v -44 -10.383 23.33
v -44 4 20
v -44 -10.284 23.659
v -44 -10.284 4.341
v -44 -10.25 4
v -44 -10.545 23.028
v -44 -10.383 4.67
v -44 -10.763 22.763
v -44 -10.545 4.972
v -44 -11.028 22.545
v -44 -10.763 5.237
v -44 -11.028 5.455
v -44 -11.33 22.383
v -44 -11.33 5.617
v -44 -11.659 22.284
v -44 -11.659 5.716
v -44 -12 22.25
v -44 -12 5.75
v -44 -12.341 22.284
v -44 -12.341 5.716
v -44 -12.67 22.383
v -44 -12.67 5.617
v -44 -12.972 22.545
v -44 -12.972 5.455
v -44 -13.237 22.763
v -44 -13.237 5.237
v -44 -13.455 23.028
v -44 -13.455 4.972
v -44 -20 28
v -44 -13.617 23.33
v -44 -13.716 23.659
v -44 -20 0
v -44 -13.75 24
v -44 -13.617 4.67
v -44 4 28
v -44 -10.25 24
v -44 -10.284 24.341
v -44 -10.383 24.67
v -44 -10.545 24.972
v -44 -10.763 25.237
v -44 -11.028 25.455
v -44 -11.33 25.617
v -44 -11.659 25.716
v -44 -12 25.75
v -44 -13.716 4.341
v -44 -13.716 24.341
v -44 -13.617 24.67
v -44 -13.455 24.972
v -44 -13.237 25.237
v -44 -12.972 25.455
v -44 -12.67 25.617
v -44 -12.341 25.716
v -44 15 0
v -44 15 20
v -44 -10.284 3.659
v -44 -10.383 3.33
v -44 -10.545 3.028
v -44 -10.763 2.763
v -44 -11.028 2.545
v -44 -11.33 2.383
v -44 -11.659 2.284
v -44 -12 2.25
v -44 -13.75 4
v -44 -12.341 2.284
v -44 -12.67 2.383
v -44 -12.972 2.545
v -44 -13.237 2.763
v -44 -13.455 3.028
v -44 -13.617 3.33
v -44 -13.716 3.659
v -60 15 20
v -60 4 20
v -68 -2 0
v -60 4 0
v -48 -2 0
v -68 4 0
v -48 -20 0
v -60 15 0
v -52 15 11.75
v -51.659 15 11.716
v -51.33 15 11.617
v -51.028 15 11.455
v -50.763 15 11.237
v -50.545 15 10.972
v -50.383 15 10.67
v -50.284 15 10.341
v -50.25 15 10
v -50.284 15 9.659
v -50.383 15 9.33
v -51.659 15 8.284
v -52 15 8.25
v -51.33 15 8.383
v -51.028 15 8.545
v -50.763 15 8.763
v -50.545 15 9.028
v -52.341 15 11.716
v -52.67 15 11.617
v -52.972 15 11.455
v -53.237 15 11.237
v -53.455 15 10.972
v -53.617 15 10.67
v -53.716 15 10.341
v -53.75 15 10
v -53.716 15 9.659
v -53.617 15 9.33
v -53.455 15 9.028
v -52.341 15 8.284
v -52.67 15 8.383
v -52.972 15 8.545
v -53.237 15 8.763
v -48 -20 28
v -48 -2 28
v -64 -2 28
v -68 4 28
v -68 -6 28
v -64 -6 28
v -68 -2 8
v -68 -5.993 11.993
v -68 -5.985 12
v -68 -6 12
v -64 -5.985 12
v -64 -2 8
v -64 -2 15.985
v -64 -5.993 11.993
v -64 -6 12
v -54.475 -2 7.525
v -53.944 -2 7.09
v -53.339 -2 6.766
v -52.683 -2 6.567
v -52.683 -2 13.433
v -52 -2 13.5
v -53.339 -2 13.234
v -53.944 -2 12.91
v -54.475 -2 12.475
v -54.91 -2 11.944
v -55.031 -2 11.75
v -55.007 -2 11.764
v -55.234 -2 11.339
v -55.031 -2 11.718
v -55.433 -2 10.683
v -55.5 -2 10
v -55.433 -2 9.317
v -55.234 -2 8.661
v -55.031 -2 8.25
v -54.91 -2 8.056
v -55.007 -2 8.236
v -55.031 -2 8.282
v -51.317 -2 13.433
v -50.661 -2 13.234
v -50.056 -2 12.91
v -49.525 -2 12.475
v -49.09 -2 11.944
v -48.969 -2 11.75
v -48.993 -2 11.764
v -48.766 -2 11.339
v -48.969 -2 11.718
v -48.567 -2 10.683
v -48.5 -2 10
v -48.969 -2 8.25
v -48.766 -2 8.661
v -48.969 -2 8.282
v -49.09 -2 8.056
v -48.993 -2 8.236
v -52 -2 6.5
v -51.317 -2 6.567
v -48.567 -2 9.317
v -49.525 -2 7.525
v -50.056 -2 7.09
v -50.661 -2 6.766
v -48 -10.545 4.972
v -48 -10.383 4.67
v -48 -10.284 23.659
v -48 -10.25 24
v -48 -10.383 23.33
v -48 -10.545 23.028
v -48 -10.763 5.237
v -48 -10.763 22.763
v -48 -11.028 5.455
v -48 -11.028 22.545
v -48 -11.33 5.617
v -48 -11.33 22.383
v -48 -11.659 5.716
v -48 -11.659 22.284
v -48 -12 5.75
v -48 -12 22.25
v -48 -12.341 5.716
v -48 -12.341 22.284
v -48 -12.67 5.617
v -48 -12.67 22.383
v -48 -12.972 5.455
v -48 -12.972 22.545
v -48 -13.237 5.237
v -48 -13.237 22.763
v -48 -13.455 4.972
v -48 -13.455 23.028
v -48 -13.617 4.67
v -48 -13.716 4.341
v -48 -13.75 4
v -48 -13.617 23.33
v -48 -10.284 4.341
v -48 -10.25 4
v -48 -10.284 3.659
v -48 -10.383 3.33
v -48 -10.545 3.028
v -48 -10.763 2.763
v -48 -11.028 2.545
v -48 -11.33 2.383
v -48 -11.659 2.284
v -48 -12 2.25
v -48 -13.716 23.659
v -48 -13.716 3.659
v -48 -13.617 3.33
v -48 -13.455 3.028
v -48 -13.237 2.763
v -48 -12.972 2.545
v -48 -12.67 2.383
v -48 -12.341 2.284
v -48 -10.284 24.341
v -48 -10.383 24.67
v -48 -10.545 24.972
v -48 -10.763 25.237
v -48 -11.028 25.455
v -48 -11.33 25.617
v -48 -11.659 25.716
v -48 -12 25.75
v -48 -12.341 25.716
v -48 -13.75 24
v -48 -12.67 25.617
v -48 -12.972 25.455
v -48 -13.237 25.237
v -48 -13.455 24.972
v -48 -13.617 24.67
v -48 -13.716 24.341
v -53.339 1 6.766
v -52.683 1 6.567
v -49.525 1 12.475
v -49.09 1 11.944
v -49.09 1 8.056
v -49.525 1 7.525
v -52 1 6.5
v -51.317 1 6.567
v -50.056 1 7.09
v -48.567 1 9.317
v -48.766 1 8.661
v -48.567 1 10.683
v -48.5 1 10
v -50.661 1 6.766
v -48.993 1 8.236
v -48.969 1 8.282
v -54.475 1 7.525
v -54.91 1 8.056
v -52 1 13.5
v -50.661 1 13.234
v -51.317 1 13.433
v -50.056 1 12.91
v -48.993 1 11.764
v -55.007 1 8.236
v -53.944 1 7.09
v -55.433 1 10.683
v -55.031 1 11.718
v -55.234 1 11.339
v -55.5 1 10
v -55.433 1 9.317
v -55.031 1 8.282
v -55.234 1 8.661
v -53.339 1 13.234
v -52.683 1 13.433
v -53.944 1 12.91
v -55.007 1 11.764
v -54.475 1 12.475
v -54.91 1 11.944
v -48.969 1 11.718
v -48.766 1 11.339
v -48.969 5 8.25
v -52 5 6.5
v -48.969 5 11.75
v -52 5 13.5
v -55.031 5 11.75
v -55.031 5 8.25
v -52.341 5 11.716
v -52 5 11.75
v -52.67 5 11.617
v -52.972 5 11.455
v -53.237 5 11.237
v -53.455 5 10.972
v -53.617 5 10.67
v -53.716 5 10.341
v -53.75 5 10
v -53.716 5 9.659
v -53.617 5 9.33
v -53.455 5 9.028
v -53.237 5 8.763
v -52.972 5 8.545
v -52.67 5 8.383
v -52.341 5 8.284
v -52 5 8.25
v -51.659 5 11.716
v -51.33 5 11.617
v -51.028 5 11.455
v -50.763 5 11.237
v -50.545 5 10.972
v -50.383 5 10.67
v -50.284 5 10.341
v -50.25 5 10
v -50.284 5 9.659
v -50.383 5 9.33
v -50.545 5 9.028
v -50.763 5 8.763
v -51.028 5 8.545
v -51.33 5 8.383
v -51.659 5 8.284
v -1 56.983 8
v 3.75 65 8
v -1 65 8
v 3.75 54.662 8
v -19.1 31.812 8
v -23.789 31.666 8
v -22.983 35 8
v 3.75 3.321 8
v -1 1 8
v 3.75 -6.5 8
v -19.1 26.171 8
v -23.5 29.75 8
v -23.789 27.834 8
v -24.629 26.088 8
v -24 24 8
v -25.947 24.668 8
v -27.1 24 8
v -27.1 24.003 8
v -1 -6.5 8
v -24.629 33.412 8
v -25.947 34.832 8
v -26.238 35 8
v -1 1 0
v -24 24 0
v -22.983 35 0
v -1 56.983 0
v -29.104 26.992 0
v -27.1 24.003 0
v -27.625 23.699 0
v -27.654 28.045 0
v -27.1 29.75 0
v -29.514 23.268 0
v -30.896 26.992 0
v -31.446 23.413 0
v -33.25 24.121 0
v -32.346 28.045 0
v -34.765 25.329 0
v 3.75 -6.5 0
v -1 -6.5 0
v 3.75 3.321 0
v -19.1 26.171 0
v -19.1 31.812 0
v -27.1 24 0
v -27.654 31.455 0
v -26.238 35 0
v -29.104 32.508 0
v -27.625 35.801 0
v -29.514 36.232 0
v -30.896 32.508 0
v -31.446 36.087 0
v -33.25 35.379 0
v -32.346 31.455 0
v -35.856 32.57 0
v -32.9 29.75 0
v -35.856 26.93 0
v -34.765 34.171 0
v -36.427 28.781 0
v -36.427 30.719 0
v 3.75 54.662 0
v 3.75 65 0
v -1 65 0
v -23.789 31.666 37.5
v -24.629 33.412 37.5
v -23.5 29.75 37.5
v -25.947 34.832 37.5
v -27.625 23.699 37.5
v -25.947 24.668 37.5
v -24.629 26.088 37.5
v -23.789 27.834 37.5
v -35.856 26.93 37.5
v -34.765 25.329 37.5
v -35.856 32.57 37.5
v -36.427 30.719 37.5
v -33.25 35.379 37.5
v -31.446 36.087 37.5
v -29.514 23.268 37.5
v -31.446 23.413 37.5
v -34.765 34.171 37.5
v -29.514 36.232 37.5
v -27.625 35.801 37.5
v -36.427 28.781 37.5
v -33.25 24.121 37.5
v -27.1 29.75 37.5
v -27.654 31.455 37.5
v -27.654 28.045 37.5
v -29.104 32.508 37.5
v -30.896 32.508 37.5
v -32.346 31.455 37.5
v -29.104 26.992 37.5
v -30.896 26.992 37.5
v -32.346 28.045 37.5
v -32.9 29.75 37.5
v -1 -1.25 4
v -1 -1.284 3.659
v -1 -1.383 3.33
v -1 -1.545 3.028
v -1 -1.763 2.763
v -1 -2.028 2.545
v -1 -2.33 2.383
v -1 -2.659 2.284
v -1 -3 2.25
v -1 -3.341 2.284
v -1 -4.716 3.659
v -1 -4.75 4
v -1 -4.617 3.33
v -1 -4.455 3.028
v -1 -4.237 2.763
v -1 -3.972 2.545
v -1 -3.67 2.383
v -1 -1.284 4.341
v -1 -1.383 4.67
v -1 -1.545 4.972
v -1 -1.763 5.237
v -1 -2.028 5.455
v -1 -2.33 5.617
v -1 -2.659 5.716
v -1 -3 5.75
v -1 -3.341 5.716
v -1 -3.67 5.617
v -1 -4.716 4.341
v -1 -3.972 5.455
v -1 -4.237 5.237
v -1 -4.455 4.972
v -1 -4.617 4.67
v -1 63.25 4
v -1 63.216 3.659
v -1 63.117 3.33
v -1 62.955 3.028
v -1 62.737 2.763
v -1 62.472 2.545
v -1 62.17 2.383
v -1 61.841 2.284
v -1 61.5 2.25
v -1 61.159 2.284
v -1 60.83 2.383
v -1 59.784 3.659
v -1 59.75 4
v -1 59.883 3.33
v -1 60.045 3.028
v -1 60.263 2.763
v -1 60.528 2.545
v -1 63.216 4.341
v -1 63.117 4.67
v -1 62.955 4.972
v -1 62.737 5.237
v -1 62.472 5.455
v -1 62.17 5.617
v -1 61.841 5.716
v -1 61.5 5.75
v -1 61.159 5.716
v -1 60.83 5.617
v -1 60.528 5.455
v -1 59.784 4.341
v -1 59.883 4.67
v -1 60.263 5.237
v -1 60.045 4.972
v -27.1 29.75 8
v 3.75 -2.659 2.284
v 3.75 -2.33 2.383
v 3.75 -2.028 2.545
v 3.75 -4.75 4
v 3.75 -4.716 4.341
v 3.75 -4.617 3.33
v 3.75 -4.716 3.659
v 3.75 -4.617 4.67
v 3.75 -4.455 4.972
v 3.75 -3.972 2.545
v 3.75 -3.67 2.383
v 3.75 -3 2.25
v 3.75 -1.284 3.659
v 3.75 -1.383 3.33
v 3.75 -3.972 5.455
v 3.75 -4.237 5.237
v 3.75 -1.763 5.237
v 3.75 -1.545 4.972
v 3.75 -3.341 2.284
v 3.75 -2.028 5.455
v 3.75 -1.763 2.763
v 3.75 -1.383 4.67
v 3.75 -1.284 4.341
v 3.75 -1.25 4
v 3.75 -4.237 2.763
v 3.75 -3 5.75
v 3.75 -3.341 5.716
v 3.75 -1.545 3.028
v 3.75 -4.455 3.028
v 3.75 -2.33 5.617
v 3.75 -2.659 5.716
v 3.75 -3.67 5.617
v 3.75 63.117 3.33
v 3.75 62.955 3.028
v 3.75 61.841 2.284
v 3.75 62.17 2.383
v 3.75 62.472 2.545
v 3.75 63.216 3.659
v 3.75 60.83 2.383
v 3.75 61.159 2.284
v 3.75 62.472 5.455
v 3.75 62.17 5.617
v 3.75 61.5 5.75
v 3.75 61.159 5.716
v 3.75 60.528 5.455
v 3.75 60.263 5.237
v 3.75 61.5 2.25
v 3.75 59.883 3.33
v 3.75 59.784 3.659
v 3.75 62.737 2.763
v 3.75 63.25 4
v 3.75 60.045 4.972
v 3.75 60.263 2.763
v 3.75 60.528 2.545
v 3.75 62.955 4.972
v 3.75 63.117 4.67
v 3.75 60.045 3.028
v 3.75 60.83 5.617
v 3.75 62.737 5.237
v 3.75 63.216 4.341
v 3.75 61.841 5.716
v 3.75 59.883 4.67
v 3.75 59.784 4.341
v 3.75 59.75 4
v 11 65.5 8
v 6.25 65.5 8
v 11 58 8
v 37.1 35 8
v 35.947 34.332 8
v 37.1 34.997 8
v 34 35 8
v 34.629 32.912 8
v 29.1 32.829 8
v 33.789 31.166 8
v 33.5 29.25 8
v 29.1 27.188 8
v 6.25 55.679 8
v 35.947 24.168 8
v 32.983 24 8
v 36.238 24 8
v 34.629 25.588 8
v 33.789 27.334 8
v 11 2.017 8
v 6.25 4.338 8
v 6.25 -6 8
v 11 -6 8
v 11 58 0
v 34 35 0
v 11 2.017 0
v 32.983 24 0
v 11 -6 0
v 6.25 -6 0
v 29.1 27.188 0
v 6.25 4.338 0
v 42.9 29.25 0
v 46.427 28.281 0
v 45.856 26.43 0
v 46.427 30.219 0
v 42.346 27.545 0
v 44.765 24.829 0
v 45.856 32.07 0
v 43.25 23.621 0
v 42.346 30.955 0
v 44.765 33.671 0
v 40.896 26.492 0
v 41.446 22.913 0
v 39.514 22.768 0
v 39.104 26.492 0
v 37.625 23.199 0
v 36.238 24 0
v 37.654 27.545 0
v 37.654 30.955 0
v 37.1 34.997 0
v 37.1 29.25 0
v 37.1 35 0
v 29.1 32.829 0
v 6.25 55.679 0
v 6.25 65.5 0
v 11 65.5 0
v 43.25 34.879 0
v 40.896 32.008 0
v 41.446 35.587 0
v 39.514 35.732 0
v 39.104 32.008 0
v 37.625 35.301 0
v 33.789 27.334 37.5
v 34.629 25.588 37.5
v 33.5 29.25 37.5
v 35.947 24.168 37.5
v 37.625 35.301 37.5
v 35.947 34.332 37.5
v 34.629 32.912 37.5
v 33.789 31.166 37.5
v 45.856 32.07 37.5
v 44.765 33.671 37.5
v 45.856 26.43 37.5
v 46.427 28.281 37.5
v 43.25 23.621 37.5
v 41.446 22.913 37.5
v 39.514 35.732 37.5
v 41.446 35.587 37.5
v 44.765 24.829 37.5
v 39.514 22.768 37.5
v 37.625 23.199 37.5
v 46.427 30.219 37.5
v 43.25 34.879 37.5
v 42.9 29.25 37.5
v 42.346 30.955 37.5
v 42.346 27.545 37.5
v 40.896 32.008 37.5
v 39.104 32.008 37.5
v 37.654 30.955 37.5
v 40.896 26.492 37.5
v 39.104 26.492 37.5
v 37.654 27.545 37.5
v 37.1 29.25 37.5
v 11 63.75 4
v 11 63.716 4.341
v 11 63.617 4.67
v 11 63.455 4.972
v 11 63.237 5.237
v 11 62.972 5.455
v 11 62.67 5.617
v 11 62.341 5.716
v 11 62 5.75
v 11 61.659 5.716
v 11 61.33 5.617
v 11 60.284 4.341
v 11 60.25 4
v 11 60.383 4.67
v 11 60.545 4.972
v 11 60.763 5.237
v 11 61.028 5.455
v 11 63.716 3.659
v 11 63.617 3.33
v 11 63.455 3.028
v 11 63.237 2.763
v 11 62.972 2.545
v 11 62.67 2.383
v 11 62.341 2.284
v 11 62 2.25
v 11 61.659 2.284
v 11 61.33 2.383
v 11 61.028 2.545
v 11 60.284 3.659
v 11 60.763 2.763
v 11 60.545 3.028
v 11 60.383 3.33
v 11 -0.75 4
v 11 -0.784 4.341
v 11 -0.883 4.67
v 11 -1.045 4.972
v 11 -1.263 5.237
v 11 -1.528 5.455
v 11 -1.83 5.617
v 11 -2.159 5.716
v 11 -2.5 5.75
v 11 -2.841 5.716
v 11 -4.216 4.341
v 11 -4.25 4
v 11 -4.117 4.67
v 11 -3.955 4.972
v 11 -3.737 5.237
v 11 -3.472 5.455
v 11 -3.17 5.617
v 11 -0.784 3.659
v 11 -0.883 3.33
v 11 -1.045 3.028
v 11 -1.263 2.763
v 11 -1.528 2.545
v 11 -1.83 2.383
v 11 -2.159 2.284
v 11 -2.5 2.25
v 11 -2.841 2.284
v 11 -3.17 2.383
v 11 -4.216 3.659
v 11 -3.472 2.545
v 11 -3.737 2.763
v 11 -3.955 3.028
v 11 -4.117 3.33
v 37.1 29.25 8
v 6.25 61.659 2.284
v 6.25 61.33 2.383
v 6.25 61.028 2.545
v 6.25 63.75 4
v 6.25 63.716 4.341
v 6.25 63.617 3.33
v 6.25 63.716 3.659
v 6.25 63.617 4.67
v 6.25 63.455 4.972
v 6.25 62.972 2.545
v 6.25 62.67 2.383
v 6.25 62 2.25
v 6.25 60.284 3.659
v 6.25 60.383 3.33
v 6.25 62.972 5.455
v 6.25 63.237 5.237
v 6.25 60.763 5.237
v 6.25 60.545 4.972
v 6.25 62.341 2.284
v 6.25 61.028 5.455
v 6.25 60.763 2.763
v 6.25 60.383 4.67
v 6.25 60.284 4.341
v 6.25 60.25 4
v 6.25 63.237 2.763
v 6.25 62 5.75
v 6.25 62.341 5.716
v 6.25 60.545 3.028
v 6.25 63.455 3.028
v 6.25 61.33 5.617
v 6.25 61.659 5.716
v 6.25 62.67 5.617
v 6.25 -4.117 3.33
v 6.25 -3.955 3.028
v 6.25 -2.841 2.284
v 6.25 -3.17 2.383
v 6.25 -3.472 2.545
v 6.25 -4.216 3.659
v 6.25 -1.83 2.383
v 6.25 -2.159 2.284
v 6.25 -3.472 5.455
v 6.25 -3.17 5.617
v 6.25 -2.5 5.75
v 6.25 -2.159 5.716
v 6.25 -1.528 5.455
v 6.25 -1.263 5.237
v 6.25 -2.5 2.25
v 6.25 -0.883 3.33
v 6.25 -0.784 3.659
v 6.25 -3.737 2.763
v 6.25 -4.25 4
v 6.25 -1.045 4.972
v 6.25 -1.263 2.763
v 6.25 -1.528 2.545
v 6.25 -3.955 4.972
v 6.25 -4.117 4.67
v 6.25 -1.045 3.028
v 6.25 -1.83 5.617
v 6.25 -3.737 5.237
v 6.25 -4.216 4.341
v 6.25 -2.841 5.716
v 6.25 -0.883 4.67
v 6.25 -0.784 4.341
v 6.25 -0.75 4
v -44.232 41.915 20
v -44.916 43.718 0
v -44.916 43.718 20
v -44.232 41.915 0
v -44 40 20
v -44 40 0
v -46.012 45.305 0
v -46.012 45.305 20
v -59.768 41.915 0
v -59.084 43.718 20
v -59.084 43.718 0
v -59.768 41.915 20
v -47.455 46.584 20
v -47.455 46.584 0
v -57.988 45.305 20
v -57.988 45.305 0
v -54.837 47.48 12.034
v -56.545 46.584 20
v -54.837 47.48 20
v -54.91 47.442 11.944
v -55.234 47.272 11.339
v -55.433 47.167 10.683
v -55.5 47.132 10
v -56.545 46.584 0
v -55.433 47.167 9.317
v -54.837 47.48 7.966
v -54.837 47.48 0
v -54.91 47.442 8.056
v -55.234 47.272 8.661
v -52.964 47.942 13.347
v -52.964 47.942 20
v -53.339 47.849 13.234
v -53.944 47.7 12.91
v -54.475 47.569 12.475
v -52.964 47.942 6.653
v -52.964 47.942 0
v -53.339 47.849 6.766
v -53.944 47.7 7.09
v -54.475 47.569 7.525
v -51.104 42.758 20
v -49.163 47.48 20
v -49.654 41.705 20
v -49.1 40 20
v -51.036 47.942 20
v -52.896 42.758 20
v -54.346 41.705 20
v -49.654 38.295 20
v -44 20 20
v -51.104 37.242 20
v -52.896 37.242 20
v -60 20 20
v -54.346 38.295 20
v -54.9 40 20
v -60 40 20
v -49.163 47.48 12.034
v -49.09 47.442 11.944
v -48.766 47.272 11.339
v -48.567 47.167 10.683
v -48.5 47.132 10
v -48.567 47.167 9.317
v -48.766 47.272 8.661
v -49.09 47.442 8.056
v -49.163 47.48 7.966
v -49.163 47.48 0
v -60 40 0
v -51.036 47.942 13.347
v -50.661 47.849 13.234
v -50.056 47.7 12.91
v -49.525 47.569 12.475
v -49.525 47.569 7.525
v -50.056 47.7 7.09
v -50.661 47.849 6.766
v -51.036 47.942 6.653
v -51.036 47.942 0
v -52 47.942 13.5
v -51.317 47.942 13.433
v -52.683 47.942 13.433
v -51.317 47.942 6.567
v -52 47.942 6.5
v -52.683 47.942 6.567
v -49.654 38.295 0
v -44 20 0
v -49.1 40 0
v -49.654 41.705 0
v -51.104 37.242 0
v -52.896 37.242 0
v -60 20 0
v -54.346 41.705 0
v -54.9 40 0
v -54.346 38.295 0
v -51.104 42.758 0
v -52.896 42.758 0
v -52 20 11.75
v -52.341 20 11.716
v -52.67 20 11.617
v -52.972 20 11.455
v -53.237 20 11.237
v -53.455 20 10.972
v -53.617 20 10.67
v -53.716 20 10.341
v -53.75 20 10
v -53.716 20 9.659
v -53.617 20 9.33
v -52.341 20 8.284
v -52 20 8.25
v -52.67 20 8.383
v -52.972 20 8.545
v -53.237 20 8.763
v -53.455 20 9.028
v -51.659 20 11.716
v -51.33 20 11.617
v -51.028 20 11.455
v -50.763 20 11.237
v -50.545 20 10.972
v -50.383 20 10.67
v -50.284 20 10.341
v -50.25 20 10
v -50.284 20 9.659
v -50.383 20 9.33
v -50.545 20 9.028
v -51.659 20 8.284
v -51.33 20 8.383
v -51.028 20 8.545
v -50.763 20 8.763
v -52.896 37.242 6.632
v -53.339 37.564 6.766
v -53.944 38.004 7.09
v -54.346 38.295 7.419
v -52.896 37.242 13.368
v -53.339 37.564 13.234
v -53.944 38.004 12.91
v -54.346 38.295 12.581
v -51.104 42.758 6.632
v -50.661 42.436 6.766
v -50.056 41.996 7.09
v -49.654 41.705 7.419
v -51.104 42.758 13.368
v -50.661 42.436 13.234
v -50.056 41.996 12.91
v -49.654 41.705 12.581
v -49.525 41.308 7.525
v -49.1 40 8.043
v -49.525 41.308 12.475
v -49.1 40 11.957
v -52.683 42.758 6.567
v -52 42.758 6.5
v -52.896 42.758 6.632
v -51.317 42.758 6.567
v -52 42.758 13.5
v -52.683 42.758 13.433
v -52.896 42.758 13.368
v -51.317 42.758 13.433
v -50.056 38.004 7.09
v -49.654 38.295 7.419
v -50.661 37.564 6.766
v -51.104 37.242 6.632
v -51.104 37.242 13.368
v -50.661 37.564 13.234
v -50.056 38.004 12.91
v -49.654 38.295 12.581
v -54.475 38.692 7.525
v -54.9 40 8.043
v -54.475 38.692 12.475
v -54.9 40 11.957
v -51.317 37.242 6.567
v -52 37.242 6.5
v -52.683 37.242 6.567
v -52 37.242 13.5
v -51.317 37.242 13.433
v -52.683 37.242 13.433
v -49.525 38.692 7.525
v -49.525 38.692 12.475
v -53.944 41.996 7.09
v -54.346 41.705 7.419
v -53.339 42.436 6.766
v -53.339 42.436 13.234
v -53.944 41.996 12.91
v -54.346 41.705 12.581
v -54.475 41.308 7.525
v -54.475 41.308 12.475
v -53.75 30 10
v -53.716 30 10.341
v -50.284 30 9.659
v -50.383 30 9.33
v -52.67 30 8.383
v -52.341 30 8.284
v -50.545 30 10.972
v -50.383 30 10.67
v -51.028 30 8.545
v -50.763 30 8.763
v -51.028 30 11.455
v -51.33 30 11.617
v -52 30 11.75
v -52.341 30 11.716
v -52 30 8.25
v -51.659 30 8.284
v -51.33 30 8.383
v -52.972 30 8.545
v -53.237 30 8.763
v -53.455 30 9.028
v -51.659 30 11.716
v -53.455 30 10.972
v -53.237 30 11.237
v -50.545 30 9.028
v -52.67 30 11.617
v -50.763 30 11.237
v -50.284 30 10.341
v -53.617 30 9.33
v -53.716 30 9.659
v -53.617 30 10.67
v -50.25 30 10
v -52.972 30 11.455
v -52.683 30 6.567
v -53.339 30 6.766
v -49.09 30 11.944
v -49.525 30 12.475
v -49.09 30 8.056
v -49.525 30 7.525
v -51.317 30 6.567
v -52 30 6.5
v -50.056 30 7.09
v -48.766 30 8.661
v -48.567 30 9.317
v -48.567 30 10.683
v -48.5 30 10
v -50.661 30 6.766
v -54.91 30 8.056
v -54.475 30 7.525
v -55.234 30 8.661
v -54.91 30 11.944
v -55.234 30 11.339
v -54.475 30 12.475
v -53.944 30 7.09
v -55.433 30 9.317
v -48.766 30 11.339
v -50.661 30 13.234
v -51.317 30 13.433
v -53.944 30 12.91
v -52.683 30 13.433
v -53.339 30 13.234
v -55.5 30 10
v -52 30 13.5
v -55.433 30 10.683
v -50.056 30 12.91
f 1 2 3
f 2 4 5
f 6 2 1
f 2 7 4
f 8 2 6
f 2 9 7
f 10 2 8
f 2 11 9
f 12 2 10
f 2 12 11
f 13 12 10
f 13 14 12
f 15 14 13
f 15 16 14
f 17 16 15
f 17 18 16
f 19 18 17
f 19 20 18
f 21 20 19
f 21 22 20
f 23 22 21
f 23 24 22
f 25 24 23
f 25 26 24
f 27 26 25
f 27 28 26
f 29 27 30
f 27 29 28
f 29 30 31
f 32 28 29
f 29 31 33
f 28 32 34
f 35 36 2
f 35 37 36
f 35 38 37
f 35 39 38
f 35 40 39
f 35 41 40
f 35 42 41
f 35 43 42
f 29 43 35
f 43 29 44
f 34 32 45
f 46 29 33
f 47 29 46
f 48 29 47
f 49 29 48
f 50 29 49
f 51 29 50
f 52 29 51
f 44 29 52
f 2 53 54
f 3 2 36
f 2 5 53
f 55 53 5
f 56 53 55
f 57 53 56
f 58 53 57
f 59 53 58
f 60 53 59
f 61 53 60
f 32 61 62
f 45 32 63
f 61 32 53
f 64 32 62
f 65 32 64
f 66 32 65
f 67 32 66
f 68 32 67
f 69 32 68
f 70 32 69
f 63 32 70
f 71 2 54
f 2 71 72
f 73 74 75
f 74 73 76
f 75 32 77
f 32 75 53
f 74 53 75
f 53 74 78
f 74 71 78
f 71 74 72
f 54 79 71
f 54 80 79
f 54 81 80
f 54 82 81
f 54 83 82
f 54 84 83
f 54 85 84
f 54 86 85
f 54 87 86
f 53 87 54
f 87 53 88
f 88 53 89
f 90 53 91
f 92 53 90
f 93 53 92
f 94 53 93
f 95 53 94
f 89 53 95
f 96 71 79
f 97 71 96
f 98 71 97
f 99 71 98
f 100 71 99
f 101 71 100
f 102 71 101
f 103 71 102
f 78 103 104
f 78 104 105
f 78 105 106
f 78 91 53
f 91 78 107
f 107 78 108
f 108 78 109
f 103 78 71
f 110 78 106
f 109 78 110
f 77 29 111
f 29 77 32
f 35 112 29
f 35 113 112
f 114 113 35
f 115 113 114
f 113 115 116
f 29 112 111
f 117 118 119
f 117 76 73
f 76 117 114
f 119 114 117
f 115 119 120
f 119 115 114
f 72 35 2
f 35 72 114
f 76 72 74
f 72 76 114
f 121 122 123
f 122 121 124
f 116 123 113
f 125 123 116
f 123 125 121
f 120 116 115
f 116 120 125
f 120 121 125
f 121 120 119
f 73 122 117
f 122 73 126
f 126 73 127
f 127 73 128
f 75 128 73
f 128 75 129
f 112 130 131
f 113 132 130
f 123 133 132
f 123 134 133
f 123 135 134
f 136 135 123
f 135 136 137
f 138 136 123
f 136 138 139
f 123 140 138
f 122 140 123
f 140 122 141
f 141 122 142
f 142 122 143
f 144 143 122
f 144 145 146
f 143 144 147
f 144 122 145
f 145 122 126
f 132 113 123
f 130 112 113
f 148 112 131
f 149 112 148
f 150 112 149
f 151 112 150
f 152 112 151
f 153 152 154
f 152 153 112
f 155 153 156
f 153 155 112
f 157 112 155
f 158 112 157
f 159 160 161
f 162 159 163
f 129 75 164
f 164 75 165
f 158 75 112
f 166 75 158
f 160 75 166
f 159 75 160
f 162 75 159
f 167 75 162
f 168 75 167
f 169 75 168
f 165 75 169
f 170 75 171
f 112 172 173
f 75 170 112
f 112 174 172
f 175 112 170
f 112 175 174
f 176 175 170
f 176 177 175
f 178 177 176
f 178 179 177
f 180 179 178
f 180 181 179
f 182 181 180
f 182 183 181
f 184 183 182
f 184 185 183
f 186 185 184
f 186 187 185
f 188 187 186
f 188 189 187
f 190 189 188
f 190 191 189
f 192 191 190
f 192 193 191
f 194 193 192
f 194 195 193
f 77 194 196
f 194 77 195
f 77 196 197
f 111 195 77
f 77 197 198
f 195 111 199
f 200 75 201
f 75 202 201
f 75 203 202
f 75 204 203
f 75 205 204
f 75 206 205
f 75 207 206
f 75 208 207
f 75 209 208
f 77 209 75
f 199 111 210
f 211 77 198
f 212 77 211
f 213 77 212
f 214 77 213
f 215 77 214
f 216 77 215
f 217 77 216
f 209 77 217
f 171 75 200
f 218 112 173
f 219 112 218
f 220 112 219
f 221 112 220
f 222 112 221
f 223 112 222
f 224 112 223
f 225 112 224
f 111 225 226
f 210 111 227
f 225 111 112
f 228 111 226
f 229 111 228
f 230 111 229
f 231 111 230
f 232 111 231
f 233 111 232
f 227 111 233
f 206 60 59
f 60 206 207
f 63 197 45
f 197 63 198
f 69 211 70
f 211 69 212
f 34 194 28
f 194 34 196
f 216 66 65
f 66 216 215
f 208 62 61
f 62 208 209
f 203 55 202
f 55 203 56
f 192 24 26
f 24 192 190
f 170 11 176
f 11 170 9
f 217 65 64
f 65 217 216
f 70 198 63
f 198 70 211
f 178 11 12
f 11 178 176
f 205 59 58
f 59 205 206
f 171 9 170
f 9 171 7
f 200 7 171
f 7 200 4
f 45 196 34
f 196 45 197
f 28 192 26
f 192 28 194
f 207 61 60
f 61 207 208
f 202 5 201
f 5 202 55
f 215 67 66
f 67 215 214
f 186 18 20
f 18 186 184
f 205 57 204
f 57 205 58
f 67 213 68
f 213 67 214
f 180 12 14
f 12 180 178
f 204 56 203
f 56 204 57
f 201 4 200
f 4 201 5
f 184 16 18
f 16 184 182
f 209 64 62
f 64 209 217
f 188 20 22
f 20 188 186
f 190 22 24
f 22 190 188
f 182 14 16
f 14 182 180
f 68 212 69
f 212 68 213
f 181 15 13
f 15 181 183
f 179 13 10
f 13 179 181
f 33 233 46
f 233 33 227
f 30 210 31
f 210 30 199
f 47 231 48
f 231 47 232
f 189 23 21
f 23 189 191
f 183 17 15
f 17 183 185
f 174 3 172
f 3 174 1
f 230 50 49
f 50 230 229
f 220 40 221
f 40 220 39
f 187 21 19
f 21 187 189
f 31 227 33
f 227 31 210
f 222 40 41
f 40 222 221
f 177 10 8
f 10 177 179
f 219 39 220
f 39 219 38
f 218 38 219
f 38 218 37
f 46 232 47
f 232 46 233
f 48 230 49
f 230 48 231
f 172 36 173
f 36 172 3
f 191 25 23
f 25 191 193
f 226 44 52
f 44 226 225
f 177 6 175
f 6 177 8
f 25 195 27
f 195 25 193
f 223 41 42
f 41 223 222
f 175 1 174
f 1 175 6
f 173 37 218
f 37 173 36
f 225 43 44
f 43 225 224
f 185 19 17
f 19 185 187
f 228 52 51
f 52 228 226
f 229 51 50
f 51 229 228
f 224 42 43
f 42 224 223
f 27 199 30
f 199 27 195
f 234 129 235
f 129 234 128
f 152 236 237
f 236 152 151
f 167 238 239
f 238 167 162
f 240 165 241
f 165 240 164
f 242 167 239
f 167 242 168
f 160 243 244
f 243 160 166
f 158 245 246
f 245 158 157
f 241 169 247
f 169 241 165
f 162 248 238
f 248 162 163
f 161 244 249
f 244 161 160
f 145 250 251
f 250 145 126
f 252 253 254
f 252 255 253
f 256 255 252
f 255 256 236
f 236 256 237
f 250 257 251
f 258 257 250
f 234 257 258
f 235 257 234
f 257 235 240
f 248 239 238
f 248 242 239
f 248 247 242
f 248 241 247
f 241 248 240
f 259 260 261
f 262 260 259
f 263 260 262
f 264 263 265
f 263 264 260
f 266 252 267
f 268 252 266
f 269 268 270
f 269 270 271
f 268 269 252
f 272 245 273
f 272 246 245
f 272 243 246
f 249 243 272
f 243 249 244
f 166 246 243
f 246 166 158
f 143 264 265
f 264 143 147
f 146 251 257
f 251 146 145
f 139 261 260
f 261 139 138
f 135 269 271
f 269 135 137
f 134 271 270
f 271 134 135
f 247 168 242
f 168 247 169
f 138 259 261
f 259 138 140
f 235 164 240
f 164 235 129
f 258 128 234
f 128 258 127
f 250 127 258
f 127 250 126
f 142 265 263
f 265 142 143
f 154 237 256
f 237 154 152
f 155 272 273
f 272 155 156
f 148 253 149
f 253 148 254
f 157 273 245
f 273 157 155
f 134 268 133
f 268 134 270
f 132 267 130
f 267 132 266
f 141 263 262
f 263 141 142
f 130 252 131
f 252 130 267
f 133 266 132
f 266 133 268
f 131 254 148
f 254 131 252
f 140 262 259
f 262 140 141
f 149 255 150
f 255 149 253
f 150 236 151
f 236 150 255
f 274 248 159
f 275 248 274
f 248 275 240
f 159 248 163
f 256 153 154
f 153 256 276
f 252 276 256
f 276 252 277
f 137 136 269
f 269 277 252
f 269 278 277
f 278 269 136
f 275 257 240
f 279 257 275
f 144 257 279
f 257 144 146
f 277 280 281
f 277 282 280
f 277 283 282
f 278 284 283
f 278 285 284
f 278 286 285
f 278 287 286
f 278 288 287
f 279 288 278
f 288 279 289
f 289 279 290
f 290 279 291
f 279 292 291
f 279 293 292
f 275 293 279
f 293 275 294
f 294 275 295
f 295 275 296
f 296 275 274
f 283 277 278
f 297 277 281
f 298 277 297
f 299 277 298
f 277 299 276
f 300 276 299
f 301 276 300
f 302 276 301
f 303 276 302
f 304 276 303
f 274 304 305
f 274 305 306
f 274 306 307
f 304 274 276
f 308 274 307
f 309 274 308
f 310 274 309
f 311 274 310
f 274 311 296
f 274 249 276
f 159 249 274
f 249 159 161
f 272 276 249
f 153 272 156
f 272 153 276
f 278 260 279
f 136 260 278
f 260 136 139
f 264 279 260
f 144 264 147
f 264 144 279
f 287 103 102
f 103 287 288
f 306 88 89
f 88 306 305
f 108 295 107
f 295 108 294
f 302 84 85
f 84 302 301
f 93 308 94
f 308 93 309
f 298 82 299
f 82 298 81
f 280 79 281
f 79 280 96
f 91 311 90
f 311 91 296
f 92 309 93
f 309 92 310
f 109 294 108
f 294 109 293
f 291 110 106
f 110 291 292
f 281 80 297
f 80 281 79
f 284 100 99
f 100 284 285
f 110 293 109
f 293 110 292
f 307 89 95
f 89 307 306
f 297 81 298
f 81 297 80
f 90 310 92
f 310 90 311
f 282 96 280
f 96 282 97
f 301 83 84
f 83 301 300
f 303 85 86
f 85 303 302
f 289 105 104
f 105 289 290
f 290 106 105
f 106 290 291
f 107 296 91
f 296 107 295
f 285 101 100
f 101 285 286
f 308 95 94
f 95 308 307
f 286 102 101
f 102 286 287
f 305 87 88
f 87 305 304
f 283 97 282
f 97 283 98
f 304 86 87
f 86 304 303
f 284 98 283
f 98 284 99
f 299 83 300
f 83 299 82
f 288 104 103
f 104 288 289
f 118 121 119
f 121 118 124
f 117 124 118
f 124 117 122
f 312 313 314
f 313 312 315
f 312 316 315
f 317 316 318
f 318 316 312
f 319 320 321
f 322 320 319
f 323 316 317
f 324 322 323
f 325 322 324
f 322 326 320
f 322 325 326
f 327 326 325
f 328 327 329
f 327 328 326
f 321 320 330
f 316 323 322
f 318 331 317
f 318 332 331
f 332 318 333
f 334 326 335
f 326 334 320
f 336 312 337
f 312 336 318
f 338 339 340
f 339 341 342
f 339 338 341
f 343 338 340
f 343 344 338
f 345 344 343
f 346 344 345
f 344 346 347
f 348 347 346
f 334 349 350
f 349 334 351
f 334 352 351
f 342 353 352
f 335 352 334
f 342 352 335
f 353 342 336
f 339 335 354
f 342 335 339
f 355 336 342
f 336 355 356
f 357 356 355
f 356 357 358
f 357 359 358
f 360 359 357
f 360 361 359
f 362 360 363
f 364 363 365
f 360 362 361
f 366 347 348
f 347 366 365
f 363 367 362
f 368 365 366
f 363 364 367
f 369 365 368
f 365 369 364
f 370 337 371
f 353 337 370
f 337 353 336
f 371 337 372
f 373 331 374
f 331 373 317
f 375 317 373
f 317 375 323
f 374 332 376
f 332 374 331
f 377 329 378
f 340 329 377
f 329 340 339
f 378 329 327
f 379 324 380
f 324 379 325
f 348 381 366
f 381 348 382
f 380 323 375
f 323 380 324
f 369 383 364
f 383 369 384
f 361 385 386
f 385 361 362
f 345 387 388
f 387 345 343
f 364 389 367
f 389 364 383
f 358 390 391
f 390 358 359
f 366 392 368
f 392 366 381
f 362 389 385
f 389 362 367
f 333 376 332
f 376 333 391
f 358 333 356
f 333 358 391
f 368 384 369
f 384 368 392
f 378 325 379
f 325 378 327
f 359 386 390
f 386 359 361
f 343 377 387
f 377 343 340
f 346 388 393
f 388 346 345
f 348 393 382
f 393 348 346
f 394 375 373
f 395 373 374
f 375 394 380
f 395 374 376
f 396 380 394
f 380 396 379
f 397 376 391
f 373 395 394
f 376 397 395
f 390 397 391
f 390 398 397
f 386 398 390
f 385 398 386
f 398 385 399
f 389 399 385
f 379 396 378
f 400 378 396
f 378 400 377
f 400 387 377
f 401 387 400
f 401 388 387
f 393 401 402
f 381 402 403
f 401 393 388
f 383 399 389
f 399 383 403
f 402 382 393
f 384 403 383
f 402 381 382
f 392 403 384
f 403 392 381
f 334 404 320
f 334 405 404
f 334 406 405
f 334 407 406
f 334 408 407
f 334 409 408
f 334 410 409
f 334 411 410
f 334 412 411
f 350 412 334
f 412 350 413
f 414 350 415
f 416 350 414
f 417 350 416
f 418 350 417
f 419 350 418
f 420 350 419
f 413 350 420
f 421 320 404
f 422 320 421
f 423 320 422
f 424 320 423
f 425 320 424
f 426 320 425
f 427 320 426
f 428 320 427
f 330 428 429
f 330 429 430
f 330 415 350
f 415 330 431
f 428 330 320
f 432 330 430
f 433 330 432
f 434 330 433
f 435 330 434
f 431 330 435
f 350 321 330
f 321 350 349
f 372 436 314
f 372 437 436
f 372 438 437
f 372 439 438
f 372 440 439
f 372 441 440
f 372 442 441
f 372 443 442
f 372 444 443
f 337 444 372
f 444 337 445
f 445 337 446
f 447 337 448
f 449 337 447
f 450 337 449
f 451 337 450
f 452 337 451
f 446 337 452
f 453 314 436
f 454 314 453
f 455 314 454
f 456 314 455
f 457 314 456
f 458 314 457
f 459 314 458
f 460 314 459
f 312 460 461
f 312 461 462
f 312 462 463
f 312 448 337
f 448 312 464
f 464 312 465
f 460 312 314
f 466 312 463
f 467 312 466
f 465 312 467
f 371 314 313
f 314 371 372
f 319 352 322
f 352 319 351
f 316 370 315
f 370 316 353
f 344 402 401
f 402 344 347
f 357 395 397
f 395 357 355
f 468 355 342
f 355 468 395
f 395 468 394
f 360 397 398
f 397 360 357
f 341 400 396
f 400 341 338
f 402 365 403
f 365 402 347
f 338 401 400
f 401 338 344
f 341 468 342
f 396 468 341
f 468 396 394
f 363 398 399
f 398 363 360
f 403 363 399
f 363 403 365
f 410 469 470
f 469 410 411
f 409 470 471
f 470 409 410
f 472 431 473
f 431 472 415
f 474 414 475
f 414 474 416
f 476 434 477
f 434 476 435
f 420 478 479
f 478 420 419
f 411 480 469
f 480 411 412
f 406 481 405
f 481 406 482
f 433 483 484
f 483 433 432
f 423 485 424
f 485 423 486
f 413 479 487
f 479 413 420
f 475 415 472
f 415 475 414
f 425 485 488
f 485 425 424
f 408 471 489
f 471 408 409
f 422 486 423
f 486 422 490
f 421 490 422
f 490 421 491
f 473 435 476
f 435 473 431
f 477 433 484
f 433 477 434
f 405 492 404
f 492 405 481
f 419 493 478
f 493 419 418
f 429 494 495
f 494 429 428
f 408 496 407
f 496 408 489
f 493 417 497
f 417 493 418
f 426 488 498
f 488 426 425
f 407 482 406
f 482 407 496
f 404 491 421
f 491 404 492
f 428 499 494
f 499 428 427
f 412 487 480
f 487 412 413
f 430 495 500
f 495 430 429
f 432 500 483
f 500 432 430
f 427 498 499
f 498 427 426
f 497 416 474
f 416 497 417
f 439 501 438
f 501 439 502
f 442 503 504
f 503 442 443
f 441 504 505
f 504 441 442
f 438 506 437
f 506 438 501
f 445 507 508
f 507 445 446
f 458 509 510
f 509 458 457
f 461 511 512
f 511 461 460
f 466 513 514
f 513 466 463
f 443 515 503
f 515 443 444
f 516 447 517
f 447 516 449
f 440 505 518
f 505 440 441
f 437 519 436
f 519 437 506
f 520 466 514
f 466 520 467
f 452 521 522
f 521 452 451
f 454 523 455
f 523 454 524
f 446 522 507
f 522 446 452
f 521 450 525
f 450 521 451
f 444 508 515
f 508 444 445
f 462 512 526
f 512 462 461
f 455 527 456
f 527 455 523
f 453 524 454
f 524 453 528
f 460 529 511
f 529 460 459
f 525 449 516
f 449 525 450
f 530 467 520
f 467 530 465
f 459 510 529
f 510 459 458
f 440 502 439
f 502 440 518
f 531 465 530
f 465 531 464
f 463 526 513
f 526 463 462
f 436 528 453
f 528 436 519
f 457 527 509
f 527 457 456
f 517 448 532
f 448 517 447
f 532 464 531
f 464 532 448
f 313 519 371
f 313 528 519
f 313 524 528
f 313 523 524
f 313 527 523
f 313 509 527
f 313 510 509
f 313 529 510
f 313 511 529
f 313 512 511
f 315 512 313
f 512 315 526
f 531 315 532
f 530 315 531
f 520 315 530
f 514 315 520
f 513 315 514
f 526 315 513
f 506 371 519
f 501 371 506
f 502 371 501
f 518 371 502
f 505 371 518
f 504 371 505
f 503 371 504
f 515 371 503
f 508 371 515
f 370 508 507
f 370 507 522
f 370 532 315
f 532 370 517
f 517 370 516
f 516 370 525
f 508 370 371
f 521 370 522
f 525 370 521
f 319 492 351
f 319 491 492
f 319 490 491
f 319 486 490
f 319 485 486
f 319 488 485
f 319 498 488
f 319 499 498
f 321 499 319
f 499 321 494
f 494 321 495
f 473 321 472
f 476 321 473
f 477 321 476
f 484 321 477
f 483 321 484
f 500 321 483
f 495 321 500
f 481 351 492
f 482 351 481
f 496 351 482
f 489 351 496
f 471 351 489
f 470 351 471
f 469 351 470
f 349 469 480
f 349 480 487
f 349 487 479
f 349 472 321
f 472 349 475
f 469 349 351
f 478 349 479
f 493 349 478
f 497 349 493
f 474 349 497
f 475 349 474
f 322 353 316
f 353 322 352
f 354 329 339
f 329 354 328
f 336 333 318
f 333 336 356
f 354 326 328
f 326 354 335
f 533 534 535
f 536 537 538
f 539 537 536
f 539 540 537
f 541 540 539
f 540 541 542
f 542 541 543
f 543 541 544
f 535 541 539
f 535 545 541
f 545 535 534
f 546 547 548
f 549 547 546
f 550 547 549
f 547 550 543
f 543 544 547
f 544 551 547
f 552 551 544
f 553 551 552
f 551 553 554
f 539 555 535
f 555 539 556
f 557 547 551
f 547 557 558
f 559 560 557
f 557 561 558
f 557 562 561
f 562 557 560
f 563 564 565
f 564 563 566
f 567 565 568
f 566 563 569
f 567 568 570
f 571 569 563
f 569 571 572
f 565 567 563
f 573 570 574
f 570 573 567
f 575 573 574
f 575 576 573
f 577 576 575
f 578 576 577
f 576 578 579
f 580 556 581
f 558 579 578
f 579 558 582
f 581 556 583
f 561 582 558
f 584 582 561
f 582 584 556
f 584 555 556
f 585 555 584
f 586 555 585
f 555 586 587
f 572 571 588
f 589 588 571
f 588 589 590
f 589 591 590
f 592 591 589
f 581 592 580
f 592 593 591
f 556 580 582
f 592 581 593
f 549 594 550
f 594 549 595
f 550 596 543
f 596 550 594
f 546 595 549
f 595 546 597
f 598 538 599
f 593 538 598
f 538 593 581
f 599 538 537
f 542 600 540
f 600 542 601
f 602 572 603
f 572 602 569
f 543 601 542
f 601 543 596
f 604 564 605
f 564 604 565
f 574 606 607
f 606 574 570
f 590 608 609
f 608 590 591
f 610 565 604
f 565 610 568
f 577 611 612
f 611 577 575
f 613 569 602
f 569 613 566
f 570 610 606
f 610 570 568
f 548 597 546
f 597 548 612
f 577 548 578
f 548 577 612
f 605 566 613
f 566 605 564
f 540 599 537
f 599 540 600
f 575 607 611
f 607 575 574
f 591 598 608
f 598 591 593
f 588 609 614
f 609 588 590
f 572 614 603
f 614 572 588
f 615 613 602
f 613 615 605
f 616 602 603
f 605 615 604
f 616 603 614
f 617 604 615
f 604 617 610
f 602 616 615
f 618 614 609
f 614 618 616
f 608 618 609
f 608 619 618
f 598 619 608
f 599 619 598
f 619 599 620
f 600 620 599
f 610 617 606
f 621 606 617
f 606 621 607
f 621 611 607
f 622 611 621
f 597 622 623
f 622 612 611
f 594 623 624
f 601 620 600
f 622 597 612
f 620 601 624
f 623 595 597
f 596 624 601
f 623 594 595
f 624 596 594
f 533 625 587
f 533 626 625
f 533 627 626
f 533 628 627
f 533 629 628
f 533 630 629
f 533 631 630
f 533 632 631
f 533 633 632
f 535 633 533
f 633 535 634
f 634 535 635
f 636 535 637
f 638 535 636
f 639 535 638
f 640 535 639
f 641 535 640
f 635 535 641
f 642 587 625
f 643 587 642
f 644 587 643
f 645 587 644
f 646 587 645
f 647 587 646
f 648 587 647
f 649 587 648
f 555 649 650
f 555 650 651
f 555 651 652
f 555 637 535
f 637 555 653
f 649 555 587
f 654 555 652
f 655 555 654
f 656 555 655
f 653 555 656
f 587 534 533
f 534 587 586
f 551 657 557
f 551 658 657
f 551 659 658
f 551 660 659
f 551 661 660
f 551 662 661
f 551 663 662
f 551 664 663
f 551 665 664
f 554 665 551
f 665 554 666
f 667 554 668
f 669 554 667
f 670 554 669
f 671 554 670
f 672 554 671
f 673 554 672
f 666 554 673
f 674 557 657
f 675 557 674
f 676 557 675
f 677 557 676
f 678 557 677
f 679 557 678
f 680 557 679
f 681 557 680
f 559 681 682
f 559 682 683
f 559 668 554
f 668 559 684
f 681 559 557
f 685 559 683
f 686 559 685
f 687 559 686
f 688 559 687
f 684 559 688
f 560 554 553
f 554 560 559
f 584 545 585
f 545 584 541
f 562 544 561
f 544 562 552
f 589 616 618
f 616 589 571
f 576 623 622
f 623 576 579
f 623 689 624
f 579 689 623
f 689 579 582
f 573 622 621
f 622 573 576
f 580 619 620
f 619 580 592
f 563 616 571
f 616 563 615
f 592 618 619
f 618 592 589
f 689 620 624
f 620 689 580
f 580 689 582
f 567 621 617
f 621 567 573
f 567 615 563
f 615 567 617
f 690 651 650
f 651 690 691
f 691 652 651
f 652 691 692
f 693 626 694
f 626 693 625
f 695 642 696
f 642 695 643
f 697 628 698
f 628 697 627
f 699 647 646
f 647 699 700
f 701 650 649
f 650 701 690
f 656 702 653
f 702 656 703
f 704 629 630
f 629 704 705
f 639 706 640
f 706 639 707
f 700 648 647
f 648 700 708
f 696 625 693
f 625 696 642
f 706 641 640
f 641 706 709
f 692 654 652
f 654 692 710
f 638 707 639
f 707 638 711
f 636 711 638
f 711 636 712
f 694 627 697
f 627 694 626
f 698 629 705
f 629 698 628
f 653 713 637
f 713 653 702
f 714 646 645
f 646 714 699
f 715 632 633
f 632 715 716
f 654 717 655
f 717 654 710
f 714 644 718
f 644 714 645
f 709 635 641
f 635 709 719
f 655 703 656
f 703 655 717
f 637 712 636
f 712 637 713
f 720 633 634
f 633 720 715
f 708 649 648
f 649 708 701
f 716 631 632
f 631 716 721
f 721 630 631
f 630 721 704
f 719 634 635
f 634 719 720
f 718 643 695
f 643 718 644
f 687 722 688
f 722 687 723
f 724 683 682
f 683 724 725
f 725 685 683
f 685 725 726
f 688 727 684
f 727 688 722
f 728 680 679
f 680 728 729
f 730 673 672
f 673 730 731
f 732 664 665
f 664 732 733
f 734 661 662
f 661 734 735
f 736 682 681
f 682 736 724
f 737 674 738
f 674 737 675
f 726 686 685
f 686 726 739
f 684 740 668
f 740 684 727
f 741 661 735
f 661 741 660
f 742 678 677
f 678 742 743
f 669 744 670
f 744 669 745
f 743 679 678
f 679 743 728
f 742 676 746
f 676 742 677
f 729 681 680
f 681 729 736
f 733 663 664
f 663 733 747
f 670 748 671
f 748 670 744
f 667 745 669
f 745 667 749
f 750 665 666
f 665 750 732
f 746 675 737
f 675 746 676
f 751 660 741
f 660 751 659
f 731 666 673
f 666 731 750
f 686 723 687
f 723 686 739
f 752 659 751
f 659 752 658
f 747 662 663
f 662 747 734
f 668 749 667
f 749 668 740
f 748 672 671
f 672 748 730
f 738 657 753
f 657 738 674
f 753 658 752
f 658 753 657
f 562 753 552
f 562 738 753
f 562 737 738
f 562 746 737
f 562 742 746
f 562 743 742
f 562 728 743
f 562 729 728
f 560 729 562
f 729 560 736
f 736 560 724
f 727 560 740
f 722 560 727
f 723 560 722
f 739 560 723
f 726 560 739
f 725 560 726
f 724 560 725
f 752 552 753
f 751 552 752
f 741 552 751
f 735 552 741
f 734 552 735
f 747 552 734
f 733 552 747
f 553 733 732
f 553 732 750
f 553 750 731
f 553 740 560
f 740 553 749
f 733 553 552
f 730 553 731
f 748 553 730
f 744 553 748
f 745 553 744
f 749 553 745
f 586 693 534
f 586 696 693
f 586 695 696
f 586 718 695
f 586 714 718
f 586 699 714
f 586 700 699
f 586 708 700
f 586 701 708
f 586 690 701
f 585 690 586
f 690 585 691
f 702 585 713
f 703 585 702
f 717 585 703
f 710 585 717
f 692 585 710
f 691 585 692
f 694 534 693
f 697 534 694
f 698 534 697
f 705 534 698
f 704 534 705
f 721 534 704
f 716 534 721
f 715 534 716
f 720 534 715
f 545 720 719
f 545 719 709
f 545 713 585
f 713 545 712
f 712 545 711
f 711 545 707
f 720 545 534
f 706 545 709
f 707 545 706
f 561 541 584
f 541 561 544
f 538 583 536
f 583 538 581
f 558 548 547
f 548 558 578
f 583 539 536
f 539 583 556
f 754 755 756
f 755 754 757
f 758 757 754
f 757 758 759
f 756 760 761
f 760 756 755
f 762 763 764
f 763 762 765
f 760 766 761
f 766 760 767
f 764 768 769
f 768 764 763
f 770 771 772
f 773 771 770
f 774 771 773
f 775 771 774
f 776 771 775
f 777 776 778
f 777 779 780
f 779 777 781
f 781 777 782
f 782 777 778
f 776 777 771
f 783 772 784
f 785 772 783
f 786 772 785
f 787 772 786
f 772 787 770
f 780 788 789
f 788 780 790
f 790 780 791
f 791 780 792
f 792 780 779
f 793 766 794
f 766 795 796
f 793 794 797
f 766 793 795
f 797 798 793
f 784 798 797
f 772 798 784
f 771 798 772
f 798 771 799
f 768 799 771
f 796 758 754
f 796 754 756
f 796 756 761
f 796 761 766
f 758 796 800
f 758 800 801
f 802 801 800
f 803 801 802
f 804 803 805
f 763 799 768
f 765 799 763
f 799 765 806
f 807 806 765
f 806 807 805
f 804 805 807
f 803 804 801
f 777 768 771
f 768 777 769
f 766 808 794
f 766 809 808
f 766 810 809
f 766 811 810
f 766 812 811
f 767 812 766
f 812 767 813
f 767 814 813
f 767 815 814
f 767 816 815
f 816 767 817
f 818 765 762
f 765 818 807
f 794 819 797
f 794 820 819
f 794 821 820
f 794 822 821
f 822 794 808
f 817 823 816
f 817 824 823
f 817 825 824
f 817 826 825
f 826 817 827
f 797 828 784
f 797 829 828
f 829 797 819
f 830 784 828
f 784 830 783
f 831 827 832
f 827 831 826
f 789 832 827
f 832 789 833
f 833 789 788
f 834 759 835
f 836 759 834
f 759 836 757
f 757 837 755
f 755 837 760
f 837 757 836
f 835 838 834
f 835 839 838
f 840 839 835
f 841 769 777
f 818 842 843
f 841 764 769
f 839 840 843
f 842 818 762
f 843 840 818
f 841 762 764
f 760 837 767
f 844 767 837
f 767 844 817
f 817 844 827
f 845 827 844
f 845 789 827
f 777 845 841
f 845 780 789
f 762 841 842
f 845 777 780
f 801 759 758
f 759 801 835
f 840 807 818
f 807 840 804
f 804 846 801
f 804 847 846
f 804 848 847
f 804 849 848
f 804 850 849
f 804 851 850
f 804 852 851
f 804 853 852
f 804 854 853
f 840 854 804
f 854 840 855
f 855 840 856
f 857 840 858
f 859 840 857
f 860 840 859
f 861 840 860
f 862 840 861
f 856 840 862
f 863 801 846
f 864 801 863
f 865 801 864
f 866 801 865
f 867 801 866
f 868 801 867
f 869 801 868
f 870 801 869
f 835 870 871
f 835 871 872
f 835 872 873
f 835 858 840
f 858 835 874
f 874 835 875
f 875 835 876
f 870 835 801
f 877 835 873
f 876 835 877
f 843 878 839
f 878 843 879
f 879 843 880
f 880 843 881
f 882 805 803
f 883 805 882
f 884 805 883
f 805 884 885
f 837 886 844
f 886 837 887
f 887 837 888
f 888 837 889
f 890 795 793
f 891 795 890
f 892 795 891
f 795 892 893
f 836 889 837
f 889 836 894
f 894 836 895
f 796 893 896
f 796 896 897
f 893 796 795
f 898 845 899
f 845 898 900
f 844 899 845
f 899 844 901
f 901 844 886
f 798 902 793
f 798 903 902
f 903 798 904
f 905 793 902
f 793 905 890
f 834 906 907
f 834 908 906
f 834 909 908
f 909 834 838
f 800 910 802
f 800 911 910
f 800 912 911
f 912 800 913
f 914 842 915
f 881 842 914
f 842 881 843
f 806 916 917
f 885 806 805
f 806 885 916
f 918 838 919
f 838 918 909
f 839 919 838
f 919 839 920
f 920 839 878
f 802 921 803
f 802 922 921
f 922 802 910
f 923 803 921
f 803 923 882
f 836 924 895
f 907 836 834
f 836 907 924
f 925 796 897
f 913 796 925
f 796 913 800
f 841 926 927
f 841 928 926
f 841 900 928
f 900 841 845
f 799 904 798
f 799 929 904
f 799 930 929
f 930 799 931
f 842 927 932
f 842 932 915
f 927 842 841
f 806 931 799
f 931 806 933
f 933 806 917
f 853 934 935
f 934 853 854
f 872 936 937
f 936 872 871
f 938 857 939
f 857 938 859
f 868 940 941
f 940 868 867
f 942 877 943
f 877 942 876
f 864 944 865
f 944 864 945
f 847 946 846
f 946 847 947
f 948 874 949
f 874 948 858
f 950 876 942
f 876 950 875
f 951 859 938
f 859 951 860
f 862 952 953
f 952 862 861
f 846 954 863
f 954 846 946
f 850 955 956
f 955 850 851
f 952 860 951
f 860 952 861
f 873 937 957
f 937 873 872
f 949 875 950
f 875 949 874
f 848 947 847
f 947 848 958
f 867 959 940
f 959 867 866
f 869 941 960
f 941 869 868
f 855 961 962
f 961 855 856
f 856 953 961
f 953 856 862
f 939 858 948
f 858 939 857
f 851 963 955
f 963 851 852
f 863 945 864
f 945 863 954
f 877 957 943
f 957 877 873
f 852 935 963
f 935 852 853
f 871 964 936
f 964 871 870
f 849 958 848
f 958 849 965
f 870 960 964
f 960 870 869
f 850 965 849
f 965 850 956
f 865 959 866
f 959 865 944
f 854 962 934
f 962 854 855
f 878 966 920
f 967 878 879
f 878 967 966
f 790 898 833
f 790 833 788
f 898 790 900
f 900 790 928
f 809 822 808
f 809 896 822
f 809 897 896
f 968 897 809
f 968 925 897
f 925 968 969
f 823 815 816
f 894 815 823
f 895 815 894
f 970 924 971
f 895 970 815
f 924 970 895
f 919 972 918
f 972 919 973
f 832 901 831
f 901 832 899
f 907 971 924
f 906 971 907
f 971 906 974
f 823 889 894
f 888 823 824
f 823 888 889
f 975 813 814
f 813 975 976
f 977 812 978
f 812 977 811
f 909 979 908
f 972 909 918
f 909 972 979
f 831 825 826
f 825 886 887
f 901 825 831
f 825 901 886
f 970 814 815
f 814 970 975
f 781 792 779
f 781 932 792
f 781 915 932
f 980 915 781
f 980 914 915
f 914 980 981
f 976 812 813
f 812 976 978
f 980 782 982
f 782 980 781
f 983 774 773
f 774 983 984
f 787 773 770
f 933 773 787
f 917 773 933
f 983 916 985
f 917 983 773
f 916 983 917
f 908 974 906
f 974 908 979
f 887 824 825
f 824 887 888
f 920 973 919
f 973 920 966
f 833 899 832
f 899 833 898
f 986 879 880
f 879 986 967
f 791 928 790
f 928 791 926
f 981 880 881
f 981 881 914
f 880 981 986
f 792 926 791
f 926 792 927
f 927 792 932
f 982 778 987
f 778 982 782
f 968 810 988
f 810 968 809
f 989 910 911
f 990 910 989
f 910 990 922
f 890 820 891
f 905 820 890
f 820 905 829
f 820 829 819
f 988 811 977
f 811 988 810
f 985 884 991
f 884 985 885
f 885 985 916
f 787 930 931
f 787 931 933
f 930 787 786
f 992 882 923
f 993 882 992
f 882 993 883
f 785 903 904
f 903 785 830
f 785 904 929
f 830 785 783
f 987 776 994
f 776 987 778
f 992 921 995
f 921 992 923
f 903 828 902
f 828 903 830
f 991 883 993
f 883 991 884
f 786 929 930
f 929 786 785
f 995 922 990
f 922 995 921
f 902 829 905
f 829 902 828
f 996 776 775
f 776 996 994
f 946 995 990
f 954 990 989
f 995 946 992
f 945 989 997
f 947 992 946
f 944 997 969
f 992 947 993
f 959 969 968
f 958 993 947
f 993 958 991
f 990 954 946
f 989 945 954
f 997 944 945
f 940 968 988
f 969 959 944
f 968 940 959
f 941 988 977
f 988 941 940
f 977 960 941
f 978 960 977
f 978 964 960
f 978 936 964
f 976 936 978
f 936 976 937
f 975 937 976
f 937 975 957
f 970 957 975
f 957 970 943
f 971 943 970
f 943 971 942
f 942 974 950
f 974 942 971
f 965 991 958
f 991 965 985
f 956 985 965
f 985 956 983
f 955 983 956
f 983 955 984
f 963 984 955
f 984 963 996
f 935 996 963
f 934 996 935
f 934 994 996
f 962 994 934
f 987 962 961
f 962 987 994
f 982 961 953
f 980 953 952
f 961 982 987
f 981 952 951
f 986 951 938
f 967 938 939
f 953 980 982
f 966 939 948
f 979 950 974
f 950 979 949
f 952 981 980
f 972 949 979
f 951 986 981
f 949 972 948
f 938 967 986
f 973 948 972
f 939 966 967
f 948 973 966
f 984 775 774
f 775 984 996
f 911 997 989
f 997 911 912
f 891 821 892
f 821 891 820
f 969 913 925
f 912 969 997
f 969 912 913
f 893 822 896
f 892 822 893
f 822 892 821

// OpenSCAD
// This script creates a bracket for mounting the RepRapDiscount graphic LCD
// panel on top of the left side Z axis mount.
//
// Parts required:
//
// (1) 110 mm M5 rod
// (1) M5 locking nut
// (1) M5 hand twist nut
// (2) M5 washer
// (4) 3mm x 15mm bolts for arms
// (2) 3mm x 20mm bolts for base
// (1) 3mm x 25mm bolts for rotating parts
// (7) 3mm nuts
// (2) 3mm washers (optional)
// 
// Instructions: (old, for non rotation version)
//
// 1) print out all parts
// 2) remove the (2) bolts holding your top left Z axis bracket
// 3) place base of mount on top of frame and thread the 20mm bolts
//    through the top Z-axis bracket and the base (see photo on
//    Thingiverse) then add 3mm washers and nuts and tighten
// 4) mount arms to the LCD panel with the spacer side pointing 
//    toward the center
// 5) thread the 5/16" bolt through the arms and base 
// 6) adjust and tighten the 5/16" bolt
// 7) connect LCD panel ribbon cables
// 
// Created by: drcharlesbell@gmail.com
//
// Enjoy!

module bracket() {
  difference() {
    union() {
      rotate([0,0,45]) translate([0,-1,0]) cube([42,42,8]);
      translate([-30,29.75,0]) cylinder(37.5,6.5,6.5);
      translate([-1,-6.5,0]) cube([5,9,8]);
      translate([-1,55.5,0]) cube([5,9.5,8]);
    }
    rotate([0,0,45]) translate([5,-1,0]) cube([37,37,8]);
    translate([-30,29.75,0]) cylinder(38.5,2.9,2.9); //for M5 rods
    rotate([0,90,0]) translate([-4,-3,-1]) cylinder(10,1.75,1.75,$fn=32);
    rotate([0,90,0]) translate([-4,61.5,-1]) cylinder(10,1.75,1.75,$fn=32);
    translate([3.75,-7,0]) cube([3,100,10]);
  }
  translate([-27.1,24,0]) cube([8,11,8]);
}

module top_clamp_center() {
  difference() {
    union() {
      translate([0,-15,0]) cube([55,20,20]);
      translate([48,20,0]) cylinder(20,8,8);
      translate([40,-15,0]) cube([16,35,20]);
    }
    // cutout for frame
    translate([5,-11,0]) cube([40,7,20]);
    translate([10,-21,0]) cube([30,10,20]);
    // bolt for clamp and nut trap
    translate([-1,0,5]) rotate([0,90,0]) cylinder(25,1.75,1.75,$fn=32);
    translate([17,0,5]) rotate([0,90,0]) cylinder(3,3.3,3.3,$fn=6);
    // nut trap
    translate([17,-9,2.15]) cube([3,10,5.7]);
    // bolt for clamp and nut trap
    translate([-1,0,15]) rotate([0,90,0]) cylinder(25,1.75,1.75,$fn=32);
    translate([17,0,15]) rotate([0,90,0]) cylinder(3,3.3,3.3,$fn=6);
    // nut trap
    translate([17,-9,12.15]) cube([3,10,5.7]);
    // slice
    translate([11,-10,0]) cube([0.75,40,20]);
    // rod
    translate([48,20,0]) cylinder(22,4.25,4.25);
  }
}

module top_clamp_side() {
rHex = 7/2;
  difference() {
    union() {
      translate([0,-20,0]) cube([16,35,20]);
      translate([-8,-20,0]) cube([24,24,28]);
    }
    // cutout for frame
    translate([-8,-20,0]) cube([4,14,28]);
    translate([-8,-20,0]) cube([4,18,12]);
    translate([-4,-20,0]) cube([4,18,28]);
    translate([-4,-20,0]) cube([16,18,28]);
   // rod
    translate([10,-12,4]) rotate([0,90,0]) cylinder(10,1.75,1.75,$fn=32);
    translate([10,-12,24]) rotate([0,90,0]) cylinder(10,1.75,1.75,$fn=32);
    translate([8,1,10])rotate([90,90,0]) cylinder(5,3.5,3.5,$fn=32);
    translate([8,5,10]){
		rotate([90,0,0,]) linear_extrude(10,center = false,2,twist = 0,slices = 20)
			polygon(points=[[sin(360*1/6)*rHex, cos(360*1/6)*rHex],[sin(360*2/6)*rHex, cos(360*2/6)*rHex],[sin(360*3/6)*rHex, cos(360*3/6)*rHex],[sin(360*4/6)*rHex, cos(360*4/6)*rHex],[sin(360*5/6)*rHex, cos(360*5/6)*rHex],[sin(360*6/6)*rHex, cos(360*6/6)*rHex]]);}
	

	// m3 screw
   translate([8,16,10])rotate([90,90,0]) cylinder(20,1.75,1.75,$fn=32);
  }
   translate([-8,-1.75,7.75]) rotate([45,0,0]) cube([4,6,6]);


}
module rotating_head() {
  difference() {
    union() {
      translate([8,40,0]) cylinder(20,8,8);
      translate([0,20,0]) cube([16,20,20]);
     }
    // rod
    translate([8,40,0]) cylinder(22,2.9,2.9); //for M5 rods

	// m3 screw
#   translate([8,39,10])rotate([90,90,0]) cylinder(20,1.75,1.75,$fn=32);
   translate([8,80,10])rotate([90,90,0]) cylinder(50,3.5,3.5,$fn=32);
  }
  
}



translate([-60,0,0]) top_clamp_side();
rotate([0,0,180]) translate([-10,-59,0]) bracket();
bracket();
translate([-60,0,0])rotating_head();
